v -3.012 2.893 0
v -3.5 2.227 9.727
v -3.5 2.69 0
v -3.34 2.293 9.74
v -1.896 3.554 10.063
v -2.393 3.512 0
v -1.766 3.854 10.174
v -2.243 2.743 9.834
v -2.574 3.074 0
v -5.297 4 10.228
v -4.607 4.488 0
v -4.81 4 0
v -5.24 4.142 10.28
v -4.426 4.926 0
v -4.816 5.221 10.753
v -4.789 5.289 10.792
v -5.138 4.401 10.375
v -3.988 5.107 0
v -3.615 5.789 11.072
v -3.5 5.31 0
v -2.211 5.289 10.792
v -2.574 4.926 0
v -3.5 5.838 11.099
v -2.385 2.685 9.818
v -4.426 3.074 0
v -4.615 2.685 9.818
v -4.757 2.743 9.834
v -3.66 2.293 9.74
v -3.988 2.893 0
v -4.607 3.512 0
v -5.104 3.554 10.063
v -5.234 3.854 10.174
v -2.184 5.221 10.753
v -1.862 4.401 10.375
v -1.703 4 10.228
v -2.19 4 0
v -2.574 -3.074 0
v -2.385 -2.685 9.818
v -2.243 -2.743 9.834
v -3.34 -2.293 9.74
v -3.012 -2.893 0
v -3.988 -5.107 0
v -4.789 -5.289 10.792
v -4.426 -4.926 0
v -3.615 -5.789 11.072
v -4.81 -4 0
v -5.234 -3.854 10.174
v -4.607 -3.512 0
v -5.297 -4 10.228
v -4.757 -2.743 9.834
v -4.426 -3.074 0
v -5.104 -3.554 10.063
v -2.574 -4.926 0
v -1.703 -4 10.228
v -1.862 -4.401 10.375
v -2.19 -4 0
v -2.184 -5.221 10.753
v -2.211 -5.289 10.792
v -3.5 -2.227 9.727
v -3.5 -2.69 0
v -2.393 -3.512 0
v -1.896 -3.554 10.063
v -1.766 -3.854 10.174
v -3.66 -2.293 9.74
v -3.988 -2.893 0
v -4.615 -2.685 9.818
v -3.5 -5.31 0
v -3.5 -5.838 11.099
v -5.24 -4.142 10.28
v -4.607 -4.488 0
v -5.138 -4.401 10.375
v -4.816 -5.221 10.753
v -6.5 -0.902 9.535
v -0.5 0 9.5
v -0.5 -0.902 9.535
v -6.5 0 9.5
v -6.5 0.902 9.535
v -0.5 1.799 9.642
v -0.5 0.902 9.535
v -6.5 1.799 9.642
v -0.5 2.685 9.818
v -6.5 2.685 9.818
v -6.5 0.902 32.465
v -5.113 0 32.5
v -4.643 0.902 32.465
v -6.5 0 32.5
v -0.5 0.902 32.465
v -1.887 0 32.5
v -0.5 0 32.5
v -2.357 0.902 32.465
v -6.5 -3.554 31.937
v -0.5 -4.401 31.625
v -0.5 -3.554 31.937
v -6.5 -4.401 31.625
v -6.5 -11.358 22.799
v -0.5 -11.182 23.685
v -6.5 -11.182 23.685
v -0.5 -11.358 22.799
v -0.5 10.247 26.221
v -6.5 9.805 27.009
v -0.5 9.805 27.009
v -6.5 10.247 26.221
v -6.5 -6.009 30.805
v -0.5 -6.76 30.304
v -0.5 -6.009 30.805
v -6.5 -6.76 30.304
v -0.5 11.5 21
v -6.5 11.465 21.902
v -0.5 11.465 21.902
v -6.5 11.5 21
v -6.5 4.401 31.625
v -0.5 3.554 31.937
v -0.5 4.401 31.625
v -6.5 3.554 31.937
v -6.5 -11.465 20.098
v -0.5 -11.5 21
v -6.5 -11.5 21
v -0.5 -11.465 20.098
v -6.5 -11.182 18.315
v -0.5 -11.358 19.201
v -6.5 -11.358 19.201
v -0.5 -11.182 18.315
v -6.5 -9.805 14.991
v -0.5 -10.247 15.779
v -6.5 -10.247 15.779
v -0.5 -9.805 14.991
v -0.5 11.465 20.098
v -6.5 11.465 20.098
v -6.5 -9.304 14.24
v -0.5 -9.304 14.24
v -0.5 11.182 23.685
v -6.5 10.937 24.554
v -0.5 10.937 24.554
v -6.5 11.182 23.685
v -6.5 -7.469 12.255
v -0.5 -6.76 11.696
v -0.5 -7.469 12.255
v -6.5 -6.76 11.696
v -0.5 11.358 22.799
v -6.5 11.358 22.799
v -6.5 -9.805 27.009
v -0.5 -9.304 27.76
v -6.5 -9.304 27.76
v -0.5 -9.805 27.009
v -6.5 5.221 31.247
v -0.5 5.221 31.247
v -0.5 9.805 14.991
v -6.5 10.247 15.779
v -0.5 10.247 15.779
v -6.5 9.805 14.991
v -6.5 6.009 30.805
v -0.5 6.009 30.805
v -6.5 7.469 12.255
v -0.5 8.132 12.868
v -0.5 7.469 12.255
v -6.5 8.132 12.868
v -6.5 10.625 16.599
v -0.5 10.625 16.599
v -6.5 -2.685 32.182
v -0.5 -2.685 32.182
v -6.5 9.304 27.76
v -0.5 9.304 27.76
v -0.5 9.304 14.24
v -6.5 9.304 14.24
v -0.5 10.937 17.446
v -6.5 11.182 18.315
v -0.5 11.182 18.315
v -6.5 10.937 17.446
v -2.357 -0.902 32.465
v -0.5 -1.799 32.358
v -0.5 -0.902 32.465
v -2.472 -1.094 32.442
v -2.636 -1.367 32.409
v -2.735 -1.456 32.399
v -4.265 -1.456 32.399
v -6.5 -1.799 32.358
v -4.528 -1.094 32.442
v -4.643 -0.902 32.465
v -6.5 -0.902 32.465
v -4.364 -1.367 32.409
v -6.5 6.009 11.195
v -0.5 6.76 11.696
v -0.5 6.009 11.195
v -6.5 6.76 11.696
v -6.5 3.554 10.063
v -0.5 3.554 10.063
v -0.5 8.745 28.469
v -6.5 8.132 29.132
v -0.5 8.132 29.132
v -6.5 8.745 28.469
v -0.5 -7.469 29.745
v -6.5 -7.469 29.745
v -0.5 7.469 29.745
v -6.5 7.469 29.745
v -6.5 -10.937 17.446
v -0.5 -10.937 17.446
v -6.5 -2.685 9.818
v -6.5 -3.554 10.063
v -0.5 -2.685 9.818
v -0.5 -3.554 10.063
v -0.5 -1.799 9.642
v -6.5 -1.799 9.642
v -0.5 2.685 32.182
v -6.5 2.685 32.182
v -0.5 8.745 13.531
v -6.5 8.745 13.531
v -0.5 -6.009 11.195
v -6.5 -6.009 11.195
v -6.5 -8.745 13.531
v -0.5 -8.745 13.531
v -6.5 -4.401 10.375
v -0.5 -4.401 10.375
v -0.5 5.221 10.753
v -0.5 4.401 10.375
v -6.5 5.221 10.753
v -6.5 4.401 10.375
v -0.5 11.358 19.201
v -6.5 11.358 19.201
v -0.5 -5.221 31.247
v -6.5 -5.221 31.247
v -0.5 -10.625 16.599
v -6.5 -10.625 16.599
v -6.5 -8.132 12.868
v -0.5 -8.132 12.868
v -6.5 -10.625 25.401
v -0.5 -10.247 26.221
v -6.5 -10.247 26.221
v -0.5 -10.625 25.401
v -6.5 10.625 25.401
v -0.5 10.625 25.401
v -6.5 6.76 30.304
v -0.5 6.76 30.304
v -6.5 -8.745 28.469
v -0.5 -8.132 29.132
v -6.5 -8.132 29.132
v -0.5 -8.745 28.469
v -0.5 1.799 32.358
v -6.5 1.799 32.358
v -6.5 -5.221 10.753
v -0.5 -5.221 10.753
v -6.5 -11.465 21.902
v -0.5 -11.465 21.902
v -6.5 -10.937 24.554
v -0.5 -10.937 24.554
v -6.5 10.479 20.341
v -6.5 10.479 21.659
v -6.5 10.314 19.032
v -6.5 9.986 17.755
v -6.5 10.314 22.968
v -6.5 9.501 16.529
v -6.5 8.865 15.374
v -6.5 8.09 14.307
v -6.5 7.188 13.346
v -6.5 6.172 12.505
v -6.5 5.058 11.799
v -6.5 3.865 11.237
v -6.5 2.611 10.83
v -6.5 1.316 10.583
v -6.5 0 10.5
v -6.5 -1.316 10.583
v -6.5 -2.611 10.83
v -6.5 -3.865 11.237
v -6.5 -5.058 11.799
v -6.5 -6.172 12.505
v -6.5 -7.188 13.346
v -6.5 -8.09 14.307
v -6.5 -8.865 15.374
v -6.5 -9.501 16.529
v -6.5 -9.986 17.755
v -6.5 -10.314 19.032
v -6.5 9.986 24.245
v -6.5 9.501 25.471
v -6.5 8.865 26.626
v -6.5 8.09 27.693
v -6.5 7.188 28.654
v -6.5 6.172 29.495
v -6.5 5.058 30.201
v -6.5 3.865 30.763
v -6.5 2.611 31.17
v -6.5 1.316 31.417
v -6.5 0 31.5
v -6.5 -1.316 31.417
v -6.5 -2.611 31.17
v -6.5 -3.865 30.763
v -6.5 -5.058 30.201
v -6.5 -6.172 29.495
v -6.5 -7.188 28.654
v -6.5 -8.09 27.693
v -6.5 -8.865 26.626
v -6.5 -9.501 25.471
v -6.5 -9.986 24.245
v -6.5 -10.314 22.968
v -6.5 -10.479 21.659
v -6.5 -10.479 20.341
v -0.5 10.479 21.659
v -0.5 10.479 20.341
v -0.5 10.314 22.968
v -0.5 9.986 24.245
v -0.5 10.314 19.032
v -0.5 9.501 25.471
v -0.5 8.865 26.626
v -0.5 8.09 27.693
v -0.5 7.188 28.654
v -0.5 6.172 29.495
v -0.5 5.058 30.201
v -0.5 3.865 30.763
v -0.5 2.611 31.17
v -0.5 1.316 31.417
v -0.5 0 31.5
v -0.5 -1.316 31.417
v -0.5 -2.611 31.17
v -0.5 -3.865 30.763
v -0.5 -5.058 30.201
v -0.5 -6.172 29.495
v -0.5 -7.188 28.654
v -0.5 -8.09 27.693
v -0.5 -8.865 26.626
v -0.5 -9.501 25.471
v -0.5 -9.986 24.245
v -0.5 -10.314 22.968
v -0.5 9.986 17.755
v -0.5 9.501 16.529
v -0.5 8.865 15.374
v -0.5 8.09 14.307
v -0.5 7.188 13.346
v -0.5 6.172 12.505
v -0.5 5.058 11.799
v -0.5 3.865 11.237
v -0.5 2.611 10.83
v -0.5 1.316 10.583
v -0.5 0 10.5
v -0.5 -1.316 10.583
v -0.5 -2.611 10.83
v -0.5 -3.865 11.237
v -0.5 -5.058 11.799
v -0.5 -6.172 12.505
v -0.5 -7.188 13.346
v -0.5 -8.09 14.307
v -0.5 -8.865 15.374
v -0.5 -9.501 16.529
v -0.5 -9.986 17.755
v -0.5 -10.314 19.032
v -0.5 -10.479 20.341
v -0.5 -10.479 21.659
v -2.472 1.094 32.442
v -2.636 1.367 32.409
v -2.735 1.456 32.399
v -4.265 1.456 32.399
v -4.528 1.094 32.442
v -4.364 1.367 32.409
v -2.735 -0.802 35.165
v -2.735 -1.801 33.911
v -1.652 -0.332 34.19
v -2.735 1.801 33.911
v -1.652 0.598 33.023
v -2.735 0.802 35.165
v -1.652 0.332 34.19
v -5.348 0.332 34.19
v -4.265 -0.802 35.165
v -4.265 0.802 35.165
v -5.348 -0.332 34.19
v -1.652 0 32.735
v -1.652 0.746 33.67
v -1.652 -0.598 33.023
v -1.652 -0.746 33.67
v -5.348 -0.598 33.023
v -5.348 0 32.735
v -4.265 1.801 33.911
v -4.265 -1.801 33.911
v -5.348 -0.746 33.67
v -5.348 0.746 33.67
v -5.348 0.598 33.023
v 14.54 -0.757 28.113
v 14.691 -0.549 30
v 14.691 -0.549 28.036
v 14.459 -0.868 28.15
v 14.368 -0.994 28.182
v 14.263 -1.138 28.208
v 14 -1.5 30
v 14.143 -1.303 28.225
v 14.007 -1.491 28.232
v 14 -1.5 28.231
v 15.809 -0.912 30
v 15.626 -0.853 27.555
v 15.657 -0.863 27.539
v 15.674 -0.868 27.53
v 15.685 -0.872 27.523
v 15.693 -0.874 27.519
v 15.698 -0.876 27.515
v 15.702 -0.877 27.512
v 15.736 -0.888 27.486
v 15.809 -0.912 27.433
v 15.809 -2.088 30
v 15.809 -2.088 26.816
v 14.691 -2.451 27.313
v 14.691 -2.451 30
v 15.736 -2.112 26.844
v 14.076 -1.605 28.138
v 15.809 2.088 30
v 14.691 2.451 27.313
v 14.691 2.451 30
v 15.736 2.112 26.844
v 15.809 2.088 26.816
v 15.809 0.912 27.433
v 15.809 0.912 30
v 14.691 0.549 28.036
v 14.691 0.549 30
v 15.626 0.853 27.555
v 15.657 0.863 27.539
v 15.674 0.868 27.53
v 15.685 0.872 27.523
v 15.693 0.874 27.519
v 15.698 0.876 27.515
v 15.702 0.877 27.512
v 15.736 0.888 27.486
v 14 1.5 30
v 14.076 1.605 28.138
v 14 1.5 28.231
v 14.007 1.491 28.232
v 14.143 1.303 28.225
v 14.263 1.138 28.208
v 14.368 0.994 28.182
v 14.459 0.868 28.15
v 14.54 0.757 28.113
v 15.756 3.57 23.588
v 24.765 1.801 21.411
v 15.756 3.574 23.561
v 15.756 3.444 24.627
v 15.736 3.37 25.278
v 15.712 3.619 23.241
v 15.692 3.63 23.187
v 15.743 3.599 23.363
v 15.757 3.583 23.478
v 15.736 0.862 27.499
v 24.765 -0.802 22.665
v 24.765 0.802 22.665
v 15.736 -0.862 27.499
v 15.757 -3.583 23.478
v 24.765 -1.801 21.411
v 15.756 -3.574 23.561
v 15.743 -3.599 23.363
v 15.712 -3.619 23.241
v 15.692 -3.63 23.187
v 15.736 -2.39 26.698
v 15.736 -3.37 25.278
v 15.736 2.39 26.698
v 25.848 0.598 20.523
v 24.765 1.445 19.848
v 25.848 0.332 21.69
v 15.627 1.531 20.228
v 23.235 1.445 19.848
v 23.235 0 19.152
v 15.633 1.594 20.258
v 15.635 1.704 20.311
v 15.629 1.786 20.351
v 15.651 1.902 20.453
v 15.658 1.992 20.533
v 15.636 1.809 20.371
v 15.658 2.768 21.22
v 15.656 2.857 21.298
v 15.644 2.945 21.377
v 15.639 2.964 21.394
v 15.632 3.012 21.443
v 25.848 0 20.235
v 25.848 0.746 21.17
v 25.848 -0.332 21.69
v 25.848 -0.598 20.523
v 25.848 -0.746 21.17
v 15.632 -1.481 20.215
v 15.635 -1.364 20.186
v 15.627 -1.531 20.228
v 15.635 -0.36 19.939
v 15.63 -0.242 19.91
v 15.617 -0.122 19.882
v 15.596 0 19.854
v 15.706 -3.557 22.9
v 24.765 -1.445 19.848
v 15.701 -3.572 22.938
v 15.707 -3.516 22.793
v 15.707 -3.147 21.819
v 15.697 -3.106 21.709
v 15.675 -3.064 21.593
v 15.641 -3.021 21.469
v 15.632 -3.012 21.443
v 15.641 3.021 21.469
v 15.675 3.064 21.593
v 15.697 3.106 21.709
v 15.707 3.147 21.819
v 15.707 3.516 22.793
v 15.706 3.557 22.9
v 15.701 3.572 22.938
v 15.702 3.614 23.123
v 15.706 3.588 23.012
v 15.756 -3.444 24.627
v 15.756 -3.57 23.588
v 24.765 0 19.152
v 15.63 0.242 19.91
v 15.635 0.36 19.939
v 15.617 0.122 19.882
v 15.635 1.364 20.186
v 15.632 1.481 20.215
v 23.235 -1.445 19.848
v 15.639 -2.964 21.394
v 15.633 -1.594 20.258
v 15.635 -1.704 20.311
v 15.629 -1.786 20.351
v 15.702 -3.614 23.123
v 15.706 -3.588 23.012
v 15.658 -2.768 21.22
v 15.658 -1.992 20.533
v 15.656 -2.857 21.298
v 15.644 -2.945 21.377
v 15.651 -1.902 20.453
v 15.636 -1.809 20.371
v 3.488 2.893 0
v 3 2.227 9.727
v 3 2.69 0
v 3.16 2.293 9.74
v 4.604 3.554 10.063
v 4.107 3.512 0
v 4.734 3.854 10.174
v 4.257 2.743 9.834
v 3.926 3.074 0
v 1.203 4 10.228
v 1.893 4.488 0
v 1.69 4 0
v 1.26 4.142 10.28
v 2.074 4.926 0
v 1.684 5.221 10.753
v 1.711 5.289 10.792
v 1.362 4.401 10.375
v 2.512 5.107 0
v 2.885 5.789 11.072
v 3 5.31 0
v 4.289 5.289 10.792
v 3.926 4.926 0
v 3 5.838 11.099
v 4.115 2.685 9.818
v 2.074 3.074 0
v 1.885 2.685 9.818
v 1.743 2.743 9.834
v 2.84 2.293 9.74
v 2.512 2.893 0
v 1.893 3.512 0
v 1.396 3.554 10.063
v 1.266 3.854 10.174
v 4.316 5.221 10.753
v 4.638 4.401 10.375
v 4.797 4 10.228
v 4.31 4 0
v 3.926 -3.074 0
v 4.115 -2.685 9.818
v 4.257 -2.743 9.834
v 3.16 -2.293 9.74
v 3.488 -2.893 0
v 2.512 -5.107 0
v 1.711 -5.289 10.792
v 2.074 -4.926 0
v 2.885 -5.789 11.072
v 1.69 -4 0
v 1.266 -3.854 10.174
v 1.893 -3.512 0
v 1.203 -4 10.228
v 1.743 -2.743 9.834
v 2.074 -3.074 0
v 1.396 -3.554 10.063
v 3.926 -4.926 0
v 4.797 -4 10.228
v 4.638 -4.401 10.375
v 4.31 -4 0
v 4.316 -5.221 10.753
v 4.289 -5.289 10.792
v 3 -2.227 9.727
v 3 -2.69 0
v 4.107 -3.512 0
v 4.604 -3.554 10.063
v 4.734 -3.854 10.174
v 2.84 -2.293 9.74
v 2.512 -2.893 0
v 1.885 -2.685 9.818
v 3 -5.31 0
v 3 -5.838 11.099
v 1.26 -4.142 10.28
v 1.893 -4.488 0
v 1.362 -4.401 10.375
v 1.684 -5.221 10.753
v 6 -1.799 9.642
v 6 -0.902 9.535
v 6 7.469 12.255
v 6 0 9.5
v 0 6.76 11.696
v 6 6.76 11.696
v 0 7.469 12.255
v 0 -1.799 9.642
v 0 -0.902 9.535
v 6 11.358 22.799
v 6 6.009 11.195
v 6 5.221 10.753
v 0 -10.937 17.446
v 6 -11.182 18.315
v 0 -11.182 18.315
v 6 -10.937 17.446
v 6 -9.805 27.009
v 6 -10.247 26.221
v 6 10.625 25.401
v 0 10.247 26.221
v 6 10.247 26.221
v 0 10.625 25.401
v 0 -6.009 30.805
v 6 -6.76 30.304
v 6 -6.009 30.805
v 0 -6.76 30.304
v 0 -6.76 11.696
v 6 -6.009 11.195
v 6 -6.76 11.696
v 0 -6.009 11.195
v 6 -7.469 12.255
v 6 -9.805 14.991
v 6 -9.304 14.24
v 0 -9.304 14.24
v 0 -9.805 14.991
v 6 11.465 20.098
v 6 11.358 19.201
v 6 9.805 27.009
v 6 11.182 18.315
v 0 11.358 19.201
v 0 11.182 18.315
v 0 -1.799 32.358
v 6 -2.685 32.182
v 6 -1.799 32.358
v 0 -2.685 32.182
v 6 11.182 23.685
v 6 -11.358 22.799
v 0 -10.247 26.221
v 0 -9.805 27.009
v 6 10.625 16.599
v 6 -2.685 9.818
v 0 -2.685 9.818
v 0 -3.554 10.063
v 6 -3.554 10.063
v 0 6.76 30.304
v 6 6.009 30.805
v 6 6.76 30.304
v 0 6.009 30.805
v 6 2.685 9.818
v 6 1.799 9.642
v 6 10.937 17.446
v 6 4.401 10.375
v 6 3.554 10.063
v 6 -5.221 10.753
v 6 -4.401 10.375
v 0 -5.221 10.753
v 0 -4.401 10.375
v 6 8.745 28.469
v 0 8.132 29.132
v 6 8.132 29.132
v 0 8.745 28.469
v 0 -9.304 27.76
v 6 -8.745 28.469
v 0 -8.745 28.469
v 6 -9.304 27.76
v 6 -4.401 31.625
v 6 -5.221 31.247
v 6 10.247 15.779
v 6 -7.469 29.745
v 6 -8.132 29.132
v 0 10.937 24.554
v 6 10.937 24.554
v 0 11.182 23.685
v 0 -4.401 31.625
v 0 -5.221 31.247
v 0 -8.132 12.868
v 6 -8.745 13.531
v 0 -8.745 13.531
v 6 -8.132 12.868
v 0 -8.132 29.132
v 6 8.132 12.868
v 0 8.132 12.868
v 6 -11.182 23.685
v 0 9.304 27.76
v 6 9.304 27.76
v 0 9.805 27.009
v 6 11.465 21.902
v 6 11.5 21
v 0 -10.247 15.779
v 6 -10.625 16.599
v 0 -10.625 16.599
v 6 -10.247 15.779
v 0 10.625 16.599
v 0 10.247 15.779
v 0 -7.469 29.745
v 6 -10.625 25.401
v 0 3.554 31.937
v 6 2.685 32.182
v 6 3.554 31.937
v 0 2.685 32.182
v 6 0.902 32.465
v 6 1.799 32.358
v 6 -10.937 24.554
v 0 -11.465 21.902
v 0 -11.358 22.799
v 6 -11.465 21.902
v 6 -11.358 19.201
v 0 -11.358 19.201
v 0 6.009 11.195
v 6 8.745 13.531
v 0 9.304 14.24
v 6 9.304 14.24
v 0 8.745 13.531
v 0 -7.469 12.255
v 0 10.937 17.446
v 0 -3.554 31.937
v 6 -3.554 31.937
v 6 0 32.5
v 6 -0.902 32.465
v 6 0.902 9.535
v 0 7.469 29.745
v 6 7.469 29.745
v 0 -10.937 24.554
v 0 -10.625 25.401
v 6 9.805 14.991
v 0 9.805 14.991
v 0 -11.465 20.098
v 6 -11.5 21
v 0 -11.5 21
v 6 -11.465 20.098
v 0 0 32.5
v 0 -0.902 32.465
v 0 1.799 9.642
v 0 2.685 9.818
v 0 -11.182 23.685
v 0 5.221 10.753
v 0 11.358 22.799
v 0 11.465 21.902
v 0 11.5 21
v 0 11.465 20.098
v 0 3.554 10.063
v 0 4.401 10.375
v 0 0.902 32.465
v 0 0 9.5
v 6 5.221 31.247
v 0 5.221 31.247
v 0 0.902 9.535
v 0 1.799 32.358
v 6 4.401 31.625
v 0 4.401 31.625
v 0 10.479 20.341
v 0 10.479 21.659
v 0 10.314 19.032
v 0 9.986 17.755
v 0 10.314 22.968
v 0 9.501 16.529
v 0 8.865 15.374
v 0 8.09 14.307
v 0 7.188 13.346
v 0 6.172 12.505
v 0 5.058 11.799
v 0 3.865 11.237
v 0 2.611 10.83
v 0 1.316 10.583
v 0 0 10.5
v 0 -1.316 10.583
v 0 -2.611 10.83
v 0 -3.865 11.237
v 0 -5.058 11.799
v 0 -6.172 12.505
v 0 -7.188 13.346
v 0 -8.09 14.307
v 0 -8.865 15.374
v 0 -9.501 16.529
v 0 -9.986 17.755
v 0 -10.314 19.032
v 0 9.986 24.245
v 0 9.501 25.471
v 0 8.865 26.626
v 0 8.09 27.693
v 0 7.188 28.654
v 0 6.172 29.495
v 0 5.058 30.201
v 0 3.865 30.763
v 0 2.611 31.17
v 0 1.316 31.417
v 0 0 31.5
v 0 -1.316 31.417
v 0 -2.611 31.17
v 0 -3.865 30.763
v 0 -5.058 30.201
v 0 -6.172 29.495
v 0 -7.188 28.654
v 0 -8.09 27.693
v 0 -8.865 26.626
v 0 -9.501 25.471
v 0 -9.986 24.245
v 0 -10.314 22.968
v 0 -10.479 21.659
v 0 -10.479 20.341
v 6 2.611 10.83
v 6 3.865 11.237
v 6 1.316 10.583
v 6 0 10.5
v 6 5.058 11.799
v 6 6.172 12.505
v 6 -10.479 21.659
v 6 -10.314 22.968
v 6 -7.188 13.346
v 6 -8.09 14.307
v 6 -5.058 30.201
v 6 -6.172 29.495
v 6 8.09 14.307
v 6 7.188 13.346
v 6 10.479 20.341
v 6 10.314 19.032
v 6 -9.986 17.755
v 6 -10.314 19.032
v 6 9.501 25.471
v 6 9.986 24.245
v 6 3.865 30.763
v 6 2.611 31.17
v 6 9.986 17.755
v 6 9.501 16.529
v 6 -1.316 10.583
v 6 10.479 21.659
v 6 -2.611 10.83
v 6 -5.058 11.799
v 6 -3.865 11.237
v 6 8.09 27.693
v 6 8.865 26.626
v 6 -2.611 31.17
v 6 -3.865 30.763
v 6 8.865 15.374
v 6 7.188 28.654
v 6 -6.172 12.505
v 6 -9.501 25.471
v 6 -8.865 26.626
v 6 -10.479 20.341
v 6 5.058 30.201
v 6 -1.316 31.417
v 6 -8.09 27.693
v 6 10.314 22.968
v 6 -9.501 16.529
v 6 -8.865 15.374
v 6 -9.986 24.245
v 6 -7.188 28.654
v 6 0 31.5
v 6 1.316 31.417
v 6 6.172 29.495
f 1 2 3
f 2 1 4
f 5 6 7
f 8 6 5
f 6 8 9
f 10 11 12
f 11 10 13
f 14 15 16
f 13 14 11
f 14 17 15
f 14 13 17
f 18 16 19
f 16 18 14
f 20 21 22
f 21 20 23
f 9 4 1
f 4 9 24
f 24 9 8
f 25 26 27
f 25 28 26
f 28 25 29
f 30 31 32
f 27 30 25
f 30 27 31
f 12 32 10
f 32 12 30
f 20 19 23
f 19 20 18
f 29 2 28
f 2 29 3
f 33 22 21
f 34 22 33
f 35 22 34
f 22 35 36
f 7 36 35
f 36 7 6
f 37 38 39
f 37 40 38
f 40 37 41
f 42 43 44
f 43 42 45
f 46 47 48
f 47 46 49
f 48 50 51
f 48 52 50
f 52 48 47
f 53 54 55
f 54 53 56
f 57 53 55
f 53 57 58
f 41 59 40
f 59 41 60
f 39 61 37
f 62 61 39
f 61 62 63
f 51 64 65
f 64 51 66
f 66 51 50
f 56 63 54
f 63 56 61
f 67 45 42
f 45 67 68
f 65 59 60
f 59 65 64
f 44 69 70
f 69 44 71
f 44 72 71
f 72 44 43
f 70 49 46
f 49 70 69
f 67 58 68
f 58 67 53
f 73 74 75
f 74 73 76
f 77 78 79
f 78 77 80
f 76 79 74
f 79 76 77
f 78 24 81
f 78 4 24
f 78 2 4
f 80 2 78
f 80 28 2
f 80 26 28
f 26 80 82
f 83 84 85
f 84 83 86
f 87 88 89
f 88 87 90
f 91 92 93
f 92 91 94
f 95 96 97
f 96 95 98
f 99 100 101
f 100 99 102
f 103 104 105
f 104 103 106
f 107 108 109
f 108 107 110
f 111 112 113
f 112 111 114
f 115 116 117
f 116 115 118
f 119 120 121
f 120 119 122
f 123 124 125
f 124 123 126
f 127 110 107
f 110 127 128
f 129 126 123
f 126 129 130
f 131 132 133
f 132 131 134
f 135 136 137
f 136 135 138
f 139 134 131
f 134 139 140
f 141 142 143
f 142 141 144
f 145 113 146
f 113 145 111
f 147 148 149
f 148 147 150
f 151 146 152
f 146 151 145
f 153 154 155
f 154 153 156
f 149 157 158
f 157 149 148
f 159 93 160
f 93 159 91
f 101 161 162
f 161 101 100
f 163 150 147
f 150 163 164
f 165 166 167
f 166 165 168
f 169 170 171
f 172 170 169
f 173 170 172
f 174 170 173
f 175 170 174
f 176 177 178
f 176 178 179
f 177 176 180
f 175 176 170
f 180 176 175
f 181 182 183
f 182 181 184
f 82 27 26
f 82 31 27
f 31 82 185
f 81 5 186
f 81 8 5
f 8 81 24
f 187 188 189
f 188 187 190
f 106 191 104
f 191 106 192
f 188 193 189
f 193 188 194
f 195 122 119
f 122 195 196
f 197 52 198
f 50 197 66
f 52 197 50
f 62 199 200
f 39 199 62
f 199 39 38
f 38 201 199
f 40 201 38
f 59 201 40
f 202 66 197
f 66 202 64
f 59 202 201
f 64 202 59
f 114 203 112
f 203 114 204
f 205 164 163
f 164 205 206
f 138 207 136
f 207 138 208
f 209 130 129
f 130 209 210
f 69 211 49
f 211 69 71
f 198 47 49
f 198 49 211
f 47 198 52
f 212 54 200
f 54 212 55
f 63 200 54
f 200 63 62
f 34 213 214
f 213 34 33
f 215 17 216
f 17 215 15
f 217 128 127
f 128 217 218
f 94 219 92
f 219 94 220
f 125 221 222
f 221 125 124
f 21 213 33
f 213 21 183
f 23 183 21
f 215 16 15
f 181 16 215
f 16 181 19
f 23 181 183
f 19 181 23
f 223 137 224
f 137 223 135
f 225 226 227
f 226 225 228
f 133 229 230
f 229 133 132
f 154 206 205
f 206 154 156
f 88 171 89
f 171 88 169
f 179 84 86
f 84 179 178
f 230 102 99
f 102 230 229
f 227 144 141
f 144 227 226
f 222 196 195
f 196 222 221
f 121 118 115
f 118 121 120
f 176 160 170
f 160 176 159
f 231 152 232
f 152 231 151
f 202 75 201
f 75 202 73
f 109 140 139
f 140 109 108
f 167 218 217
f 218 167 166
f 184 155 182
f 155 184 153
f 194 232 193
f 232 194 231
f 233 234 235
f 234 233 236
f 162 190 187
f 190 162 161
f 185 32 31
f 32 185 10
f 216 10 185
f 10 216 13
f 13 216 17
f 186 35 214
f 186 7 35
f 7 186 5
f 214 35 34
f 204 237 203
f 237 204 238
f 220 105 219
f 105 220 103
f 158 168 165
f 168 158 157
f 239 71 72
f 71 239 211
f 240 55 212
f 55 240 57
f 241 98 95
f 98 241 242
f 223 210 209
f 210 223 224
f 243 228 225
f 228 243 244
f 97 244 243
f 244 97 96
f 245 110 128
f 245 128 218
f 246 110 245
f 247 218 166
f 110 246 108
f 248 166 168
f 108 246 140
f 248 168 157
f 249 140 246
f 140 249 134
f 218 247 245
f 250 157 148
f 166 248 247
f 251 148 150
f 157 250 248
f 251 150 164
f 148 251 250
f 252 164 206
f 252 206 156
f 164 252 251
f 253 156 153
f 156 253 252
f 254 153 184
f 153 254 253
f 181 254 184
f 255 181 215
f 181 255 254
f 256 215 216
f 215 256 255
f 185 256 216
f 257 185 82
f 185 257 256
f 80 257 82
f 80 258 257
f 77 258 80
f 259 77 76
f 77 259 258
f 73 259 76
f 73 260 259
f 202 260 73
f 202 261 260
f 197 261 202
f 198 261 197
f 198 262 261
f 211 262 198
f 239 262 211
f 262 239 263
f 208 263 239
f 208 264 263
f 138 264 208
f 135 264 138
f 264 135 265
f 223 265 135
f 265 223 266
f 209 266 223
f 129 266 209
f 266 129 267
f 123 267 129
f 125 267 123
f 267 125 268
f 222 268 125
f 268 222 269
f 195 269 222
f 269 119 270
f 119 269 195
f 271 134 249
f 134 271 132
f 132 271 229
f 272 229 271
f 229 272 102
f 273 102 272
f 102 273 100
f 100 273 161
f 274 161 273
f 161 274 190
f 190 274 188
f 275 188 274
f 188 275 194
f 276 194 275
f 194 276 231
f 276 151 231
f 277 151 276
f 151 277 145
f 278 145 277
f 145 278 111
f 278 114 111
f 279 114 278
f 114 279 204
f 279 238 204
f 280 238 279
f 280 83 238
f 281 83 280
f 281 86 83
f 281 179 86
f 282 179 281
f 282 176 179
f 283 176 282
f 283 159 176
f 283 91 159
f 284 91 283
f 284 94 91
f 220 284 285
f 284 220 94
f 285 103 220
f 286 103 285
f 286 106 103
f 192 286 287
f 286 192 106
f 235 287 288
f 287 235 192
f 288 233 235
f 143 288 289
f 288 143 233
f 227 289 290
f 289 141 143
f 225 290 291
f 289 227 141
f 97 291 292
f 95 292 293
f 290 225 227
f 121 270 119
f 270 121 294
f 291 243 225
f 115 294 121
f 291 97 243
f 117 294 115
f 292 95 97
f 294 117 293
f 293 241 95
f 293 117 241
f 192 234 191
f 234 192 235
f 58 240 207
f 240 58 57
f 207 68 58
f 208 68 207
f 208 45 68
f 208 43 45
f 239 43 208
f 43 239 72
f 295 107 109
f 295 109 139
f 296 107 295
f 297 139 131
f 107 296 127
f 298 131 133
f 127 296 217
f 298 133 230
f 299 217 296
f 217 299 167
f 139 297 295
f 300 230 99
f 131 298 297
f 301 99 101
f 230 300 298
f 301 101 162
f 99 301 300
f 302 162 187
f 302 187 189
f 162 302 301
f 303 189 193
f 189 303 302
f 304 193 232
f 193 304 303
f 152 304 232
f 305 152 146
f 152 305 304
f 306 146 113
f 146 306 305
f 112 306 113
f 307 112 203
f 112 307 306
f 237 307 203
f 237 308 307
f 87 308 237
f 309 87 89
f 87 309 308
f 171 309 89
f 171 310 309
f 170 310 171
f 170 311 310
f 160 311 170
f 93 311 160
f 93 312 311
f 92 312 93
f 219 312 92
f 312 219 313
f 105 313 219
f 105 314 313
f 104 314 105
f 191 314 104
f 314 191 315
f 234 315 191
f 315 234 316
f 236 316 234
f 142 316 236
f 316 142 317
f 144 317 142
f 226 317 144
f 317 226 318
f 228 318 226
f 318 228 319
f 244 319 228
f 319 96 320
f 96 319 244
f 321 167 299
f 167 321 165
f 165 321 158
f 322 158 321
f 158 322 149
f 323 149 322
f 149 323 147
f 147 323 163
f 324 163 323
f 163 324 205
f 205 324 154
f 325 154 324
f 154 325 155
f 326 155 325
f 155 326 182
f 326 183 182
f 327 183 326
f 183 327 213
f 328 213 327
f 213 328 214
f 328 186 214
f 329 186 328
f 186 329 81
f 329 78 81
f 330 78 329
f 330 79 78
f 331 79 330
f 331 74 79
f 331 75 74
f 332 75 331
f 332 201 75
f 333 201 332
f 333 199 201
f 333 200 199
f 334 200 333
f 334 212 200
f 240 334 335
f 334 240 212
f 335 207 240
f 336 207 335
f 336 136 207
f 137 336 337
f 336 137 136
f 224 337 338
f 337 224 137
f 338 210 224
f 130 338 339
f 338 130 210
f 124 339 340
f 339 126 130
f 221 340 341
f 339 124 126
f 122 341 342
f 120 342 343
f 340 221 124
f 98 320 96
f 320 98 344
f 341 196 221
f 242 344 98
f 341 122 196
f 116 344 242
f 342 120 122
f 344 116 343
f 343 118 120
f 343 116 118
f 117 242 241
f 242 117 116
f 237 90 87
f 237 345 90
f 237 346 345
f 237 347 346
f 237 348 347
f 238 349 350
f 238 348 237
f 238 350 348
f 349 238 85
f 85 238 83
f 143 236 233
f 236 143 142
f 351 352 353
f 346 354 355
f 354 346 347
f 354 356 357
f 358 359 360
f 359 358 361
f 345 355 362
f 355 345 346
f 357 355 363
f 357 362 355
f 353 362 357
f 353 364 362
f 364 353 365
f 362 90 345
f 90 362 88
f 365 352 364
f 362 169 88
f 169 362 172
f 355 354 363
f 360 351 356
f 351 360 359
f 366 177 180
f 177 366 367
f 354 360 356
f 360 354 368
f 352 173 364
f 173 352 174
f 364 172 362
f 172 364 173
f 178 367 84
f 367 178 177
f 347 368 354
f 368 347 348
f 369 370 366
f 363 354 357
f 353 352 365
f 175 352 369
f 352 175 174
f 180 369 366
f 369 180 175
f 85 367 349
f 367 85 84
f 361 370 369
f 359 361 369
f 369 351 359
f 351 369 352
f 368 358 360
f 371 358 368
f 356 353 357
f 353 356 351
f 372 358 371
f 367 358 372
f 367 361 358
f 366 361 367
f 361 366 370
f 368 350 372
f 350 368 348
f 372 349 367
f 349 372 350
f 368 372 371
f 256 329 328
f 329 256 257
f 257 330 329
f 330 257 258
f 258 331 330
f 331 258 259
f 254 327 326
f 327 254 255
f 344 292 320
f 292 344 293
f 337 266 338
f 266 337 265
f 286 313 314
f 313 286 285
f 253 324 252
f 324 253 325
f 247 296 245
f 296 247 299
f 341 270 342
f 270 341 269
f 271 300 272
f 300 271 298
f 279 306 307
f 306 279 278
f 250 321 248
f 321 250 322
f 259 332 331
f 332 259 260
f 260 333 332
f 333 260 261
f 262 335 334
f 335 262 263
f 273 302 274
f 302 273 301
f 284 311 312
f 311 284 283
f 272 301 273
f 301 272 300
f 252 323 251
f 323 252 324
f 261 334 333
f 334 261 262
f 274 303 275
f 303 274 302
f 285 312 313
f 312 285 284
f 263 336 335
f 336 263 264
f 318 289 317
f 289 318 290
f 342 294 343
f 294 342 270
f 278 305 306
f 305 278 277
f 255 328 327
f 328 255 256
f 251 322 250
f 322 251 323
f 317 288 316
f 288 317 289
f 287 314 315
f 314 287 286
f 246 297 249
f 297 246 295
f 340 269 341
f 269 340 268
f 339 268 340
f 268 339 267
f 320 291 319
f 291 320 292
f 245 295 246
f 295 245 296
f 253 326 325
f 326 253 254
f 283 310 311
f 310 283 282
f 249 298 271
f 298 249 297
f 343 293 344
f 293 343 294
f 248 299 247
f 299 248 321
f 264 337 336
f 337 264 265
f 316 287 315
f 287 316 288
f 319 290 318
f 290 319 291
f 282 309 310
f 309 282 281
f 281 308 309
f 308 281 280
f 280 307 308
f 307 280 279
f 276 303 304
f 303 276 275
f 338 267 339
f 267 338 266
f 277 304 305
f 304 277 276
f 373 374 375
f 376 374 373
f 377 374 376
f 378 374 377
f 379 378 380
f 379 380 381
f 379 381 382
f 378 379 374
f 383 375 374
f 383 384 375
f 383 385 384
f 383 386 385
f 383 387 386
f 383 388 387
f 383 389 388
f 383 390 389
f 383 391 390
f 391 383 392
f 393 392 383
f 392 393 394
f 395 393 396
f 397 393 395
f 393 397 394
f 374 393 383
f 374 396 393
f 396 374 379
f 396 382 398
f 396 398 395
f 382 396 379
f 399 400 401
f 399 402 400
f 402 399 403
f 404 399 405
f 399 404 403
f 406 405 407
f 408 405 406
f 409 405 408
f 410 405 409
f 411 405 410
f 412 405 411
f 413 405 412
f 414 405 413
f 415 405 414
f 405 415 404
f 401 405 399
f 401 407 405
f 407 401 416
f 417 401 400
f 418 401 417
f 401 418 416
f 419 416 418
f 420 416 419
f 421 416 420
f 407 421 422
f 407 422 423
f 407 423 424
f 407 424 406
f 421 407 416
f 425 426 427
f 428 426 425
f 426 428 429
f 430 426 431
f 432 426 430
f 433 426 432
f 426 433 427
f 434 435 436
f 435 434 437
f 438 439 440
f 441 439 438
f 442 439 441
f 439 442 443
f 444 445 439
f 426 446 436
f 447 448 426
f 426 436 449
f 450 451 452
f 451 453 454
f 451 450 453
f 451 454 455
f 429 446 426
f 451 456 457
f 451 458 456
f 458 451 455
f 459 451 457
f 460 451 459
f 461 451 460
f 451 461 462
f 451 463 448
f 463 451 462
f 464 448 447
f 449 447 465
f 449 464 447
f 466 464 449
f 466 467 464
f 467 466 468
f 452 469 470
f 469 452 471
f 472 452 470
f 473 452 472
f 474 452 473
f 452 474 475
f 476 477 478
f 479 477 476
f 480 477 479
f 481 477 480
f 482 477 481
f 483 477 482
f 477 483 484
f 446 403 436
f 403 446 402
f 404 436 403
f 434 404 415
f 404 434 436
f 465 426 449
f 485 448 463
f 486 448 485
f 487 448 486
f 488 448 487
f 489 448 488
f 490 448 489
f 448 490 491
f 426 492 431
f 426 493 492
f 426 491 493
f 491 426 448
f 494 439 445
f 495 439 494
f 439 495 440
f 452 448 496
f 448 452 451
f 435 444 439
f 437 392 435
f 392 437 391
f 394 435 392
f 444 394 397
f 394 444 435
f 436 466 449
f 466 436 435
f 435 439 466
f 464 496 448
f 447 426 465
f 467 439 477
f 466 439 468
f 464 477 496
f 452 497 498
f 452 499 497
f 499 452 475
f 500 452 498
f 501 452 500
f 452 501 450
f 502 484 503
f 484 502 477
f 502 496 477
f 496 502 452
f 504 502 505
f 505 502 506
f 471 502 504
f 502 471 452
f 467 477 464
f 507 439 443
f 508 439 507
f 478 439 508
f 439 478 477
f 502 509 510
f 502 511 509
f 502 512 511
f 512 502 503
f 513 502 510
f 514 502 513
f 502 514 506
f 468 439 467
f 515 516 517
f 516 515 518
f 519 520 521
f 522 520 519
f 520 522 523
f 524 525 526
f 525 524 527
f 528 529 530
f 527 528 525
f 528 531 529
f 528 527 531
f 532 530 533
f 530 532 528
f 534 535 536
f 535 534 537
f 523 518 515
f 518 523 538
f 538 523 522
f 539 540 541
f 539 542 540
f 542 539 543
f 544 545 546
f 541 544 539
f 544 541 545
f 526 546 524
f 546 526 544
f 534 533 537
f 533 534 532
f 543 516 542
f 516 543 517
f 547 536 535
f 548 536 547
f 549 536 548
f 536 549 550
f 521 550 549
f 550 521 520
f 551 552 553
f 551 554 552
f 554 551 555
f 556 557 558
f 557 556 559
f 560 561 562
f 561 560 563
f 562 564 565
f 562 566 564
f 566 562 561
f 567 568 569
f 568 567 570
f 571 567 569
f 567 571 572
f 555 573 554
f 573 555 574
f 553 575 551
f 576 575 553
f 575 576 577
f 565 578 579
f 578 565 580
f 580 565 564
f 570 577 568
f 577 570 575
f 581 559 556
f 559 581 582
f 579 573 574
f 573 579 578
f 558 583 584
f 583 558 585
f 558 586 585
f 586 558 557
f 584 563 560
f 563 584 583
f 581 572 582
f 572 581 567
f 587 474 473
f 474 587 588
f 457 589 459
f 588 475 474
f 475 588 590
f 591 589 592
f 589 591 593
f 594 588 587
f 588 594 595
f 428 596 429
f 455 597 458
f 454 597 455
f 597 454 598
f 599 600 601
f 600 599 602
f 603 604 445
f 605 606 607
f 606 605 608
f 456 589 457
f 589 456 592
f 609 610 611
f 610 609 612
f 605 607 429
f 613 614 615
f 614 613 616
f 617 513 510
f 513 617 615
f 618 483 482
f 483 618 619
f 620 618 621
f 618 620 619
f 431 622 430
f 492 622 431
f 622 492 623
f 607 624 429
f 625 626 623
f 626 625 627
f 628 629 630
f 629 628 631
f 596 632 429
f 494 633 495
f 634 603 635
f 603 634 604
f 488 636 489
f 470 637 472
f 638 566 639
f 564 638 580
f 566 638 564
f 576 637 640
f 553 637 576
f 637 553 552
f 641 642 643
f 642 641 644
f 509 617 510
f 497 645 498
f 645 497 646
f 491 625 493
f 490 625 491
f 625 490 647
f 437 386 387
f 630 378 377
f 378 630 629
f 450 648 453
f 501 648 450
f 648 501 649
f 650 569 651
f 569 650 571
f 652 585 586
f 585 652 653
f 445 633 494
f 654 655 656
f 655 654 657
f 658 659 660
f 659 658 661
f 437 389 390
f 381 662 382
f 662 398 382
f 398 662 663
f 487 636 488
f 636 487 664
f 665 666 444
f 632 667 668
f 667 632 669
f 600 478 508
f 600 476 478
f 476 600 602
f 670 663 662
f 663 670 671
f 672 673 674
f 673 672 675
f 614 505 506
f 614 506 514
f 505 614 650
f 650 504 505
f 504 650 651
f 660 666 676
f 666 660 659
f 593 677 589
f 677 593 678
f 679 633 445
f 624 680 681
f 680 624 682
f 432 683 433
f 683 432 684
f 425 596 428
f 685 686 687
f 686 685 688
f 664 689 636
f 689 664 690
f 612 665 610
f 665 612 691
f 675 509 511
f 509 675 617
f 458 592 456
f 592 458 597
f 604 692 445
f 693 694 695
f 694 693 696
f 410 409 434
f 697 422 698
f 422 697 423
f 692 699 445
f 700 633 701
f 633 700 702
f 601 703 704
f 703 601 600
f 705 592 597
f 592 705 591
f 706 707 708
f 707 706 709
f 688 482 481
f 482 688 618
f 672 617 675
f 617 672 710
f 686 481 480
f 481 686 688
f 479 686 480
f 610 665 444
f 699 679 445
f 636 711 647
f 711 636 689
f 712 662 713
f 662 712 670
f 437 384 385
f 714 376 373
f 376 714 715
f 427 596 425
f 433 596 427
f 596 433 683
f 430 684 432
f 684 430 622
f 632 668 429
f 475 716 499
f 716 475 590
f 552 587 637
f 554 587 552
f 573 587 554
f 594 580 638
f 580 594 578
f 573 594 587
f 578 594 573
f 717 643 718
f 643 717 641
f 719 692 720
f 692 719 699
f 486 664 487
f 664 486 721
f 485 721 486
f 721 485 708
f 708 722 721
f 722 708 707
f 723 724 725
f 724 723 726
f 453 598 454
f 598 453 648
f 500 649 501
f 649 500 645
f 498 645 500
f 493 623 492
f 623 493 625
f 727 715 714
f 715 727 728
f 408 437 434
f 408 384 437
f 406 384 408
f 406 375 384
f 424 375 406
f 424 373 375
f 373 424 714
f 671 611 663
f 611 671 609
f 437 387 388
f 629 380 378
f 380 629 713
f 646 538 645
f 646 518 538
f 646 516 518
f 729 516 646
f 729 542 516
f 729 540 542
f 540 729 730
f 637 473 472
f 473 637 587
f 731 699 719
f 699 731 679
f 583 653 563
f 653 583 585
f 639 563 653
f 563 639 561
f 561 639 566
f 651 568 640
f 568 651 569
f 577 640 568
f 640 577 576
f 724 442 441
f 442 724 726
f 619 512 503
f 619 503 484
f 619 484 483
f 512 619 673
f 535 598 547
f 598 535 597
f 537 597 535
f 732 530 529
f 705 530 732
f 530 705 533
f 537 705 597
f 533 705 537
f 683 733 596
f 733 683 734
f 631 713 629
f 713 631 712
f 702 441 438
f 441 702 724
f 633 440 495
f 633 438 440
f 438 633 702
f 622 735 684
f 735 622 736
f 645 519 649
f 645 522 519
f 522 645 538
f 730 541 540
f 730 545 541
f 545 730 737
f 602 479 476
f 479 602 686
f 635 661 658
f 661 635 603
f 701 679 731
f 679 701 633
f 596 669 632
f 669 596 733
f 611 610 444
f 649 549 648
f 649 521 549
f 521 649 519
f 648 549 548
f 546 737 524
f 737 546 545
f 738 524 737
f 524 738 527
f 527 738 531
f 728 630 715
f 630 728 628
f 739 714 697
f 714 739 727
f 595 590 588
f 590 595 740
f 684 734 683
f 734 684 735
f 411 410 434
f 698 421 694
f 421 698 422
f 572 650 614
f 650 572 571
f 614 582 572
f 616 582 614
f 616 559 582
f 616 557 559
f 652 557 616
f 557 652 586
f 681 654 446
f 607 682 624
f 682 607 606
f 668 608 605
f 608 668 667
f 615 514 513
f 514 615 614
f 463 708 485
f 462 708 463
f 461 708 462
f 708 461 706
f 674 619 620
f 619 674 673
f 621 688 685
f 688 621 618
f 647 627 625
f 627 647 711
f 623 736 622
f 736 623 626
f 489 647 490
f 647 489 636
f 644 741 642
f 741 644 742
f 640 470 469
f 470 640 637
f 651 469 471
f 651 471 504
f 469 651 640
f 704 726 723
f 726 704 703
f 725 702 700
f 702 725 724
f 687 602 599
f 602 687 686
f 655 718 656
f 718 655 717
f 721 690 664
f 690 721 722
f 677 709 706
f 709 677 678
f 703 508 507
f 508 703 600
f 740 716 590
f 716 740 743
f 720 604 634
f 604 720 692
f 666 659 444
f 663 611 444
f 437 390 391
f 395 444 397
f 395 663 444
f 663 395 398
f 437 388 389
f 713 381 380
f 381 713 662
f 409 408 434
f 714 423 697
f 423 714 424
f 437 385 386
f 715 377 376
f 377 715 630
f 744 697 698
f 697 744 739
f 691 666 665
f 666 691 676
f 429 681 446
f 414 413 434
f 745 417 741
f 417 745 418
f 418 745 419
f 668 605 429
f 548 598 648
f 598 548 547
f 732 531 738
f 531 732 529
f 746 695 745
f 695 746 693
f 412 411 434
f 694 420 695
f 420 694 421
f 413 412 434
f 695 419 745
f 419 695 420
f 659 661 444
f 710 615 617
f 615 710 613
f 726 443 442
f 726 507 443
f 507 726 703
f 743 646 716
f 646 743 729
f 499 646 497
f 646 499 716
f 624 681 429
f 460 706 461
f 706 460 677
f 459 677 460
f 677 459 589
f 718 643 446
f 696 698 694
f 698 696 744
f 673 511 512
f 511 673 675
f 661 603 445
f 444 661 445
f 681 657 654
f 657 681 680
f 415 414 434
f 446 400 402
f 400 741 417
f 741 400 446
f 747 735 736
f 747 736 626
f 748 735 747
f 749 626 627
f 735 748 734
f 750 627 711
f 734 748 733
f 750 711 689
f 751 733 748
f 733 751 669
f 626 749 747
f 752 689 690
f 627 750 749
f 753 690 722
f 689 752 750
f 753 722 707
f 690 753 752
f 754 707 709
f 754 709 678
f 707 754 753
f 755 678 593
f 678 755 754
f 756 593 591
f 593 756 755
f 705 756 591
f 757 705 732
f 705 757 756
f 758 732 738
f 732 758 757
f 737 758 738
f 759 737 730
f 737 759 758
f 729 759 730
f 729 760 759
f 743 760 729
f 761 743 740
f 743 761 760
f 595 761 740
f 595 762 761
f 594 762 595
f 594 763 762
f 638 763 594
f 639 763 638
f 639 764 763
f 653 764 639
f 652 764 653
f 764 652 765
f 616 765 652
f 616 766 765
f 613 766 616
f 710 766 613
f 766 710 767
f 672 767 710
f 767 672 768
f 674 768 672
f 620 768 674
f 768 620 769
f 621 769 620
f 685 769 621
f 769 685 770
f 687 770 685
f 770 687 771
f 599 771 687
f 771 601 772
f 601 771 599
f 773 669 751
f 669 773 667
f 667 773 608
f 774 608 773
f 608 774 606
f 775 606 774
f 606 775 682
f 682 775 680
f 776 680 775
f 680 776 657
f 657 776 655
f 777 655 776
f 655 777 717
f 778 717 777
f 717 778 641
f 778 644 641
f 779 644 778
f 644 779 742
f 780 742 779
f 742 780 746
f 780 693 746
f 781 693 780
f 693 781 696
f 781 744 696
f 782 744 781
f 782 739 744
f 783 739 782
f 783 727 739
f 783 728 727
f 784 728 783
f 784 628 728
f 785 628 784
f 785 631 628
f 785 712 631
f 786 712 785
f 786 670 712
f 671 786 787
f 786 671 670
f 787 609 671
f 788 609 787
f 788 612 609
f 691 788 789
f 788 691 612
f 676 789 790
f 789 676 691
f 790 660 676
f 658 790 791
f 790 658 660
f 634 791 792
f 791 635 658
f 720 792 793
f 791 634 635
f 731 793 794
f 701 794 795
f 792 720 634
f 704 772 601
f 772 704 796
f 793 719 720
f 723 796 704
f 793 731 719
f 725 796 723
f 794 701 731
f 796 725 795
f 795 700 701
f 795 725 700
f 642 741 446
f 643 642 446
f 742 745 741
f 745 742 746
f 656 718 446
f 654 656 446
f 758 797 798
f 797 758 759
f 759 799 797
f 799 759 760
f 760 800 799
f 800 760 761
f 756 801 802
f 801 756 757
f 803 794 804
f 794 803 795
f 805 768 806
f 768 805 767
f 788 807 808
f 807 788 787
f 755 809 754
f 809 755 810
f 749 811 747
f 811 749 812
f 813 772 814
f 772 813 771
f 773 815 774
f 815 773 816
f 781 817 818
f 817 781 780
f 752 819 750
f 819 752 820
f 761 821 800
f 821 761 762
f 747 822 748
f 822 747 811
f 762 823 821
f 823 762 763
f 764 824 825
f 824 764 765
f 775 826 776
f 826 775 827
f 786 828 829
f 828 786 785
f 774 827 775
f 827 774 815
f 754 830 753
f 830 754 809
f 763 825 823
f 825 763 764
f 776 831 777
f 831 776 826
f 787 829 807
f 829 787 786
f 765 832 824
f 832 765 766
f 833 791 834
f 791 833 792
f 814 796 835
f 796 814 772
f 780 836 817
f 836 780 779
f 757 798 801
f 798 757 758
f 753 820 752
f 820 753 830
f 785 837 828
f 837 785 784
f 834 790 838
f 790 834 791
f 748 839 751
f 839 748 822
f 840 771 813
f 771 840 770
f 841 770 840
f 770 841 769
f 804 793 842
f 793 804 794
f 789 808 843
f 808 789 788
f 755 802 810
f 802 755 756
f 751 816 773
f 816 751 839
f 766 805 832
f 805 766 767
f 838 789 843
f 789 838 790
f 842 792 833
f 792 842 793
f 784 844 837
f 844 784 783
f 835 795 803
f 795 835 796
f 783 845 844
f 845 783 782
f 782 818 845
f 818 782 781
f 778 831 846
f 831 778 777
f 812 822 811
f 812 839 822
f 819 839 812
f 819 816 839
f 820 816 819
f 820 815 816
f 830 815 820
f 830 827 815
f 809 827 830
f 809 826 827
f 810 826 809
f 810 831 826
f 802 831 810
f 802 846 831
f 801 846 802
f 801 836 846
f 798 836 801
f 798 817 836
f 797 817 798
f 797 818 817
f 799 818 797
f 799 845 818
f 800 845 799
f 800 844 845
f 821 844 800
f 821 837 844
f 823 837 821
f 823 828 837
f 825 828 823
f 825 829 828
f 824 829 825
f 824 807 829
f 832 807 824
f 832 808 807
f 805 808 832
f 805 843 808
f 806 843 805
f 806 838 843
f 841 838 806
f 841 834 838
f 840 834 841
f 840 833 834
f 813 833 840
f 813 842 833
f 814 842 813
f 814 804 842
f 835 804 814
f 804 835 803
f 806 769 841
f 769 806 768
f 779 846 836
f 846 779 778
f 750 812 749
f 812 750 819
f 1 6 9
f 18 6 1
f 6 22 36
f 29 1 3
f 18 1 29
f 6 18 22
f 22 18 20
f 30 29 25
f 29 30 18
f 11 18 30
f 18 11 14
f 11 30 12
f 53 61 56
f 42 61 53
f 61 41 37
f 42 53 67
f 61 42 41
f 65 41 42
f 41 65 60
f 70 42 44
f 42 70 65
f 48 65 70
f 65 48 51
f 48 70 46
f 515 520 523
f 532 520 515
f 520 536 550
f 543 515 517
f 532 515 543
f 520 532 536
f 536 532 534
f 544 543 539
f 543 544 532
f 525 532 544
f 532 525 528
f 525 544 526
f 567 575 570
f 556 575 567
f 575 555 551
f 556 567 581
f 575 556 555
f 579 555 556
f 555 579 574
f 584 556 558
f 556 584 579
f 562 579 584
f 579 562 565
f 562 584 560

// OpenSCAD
/**
  Cork Pal - Customizable Sheep

  by Phil Schatzmann 
  
**/

 
corkDiameterFront=21;
corkDiameterBack=21;
legHeight=10;
cylinderLength=6;
neck=3;



module body(corkDiameter) {
     cylinder(h=cylinderLength, d=corkDiameter+2, center=false,$fn=80);
}

module bodyHole(corkDiameter) {
    cylinder(h=cylinderLength+5, d=corkDiameter,$fn=50);
}
 
module legs(corkRadius) {
    translate([corkRadius/2-4,4,3]) rotate([0,90,0]) 
        cylinder(legHeight+11,2,1,$fn=8);
    translate([corkRadius/2-4,-4,3]) rotate([0,90,0]) 
        cylinder(legHeight+11,2,1,$fn=8); 
}
 
module back() {
    difference() {
        union() {
            body(corkDiameterBack);
            legs(corkDiameterBack);
            translate([-(corkDiameterBack/2+2),0,3]) 
                sphere(r=2);
        }
        translate([0,0,-5]) bodyHole(corkDiameterBack);
    }
}
 
module ears() {
    translate([-neck-4,-1.5,15]) rotate([0,90,0]) 
     cylinder(h=4, d1=2, d2=2, center=true);
    translate([-neck-4,1.5,15]) rotate([0,90,0]) 
     cylinder(h=4, d1=2, d2=2, center=true);
}

module head() {
    hull() {
        translate([-neck,0,14]) 
            sphere(4);  
        translate([-neck+3,0,24]) 
            sphere(2);    
    }
    ears();
}

module frontSolid() {
    union() {
        hull() {
            body(corkDiameterFront);
            translate([-7,0,8]) 
                sphere(2);
            translate([-neck,0,14]) 
                sphere(4); 
        }

        head();
        
        translate([0,0,cylinderLength-6]) 
            legs(corkDiameterFront);
        }
}

module front() {
     difference() {
        frontSolid();
        translate([0,0,-5])  
           bodyHole(corkDiameterFront);

    }
}

module printAll() {
    difference() {
        union() {
            if (corkDiameterBack>0){
                translate([-cylinderLength-0.5, 0,legHeight+11]) rotate([0,90,0])  
                    back();
            }
            if (corkDiameterFront>0){
                translate([0,0,legHeight+11]) rotate([0,90,0]) 
                    front();
            }
        }
        // make feet levelled
        translate([-500,-500,-100]) cube(size=[1000,1000,100]);
    }
}



printAll();
